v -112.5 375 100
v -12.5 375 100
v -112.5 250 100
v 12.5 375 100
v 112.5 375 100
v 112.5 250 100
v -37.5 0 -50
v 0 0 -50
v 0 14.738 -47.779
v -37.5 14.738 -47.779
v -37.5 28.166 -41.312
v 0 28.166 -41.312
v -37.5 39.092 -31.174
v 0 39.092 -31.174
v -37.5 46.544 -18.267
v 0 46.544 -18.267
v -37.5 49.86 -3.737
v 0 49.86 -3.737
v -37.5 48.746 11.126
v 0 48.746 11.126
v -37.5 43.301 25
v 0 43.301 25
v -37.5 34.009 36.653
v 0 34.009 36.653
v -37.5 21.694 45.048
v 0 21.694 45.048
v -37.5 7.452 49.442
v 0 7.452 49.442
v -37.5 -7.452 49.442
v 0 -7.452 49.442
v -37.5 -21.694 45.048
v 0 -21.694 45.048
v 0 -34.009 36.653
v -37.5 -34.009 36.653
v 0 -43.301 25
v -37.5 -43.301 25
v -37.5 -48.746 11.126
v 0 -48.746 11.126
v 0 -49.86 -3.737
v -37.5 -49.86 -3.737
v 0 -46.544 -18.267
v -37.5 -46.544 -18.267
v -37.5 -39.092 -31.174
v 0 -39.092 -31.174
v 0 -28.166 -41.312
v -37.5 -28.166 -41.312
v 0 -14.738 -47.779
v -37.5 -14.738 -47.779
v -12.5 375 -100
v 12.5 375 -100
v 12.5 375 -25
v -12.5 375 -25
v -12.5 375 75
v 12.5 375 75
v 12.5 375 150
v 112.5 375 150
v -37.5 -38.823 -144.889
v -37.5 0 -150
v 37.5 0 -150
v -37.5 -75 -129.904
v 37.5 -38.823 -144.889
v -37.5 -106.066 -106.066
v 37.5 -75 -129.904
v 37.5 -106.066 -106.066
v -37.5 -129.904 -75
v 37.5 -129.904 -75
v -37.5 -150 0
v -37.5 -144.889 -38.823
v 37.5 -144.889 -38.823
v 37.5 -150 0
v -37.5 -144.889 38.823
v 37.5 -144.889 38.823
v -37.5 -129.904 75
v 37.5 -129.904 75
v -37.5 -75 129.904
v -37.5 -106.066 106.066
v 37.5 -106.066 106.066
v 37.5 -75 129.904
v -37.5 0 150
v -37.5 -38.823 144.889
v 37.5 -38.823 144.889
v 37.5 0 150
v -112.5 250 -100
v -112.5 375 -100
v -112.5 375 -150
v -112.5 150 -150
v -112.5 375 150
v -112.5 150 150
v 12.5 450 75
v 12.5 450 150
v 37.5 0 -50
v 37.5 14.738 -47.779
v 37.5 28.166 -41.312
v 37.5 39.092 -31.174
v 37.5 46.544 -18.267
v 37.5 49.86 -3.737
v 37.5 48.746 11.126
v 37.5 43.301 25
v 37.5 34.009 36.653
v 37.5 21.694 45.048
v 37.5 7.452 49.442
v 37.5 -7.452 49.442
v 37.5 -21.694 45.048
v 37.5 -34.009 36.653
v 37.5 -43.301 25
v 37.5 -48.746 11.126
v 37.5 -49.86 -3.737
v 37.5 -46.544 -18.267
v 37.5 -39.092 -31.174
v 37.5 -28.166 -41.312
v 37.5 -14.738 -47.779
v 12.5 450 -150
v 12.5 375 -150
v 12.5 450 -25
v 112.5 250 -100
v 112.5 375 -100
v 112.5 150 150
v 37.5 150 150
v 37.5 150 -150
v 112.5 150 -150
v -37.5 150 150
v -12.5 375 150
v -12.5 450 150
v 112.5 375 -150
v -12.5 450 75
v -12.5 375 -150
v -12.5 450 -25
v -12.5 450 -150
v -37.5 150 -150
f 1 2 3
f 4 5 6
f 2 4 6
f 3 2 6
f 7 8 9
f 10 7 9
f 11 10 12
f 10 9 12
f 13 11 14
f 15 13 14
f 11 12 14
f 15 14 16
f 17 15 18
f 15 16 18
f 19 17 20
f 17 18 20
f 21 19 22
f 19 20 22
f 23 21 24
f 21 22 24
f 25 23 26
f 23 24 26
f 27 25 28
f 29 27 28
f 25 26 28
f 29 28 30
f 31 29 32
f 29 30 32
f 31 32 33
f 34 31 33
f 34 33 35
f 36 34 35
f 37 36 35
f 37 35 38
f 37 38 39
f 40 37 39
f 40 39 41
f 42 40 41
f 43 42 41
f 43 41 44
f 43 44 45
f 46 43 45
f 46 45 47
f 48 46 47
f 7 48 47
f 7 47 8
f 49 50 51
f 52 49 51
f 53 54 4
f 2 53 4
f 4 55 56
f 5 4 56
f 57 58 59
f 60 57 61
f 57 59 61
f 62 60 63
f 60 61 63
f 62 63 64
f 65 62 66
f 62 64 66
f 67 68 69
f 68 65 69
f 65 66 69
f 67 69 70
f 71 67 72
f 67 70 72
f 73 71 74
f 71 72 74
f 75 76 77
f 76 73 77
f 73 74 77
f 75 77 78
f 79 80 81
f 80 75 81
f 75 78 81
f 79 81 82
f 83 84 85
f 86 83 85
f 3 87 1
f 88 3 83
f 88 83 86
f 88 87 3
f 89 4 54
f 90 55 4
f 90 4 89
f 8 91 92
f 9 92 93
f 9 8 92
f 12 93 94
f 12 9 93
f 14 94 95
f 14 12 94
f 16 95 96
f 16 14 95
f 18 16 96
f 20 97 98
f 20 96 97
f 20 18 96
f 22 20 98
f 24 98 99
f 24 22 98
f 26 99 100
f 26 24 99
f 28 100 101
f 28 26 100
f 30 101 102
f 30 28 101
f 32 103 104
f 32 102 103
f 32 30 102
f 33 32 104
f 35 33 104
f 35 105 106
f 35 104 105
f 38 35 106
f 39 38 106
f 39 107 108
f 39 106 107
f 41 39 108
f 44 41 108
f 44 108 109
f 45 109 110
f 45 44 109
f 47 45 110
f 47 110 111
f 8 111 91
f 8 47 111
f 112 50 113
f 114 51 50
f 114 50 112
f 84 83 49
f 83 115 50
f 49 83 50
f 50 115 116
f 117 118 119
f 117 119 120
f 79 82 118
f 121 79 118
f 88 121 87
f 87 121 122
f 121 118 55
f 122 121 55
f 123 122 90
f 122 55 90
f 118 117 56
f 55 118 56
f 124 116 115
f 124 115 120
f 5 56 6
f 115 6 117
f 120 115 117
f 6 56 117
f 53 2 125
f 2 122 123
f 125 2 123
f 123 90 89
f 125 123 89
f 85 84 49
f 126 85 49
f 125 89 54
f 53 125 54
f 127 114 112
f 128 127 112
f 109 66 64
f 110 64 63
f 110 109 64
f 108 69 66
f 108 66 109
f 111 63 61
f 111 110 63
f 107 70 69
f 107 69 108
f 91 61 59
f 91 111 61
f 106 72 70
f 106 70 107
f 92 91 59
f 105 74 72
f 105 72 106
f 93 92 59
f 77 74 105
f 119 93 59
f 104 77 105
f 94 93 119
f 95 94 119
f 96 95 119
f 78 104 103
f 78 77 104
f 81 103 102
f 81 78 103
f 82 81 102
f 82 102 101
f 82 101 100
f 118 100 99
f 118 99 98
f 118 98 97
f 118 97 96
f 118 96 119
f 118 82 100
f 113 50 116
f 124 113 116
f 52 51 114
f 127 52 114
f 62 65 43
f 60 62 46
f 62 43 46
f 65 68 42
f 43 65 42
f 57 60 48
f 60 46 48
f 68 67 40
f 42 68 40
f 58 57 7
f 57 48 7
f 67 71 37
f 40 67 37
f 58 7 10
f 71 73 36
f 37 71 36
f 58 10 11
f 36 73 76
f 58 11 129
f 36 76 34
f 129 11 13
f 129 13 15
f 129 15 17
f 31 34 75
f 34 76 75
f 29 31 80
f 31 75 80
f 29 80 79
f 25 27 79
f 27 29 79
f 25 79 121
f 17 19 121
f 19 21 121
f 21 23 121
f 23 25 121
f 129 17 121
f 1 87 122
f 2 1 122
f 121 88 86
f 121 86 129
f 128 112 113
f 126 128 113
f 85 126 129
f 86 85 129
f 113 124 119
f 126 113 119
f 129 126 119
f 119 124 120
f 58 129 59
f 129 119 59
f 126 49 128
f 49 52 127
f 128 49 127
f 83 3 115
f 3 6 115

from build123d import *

# Parameters (mm, degrees)
SKETCH1_R           = 50
BOSS_EXTRUDE1_DEPTH = 112.5
SKETCH2_W           = 75
SKETCH2_H           = 300
SKETCH2_W_2         = 100
SKETCH2_H_2         = 75
CUT_EXTRUDE2_DEPTH  = 553.40949485


with BuildPart() as part:
    # Sketch1 → Boss-Extrude1 (new body)
    with BuildSketch(Plane.YZ):
        with BuildLine():
            Line((0, 150), (450, 150))
            Line((450, 150), (450, 75))
            Line((450, 75), (375, 75))
            Line((375, 75), (375, 100))
            Line((375, 100), (250, 100))
            Line((250, 100), (250, -100))
            Line((250, -100), (375, -100))
            Line((375, -100), (375, -25))
            Line((375, -25), (450, -25))
            Line((450, -25), (450, -150))
            Line((450, -150), (0, -150))
            ThreePointArc((0, -150), (-150, 0), (0, 150))
        make_face()
        with Locations(Location((0, 0, 0), (0, 0, 270))):
            Circle(SKETCH1_R, mode=Mode.SUBTRACT)
    extrude(amount=BOSS_EXTRUDE1_DEPTH)

    # Mirror1: part across plane


with BuildPart() as part_1:
    add(part.part)
    add(part.part.mirror(Plane(origin=(0, 0, 0), x_dir=(0, 0, 1), z_dir=(1, 0, 0))))

    # Sketch2 → Cut-Extrude2 (cut, through all)
    with BuildSketch(Plane.XY.offset(150)):
        with Locations((75, 0)):
            Rectangle(SKETCH2_W, SKETCH2_H)
        with Locations((62.5, 412.5)):
            Rectangle(SKETCH2_W_2, SKETCH2_H_2)
        with Locations((-75, 0)):
            Rectangle(SKETCH2_W, SKETCH2_H)
        with Locations((-62.5, 412.5)):
            Rectangle(SKETCH2_W_2, SKETCH2_H_2)
    extrude(amount=-CUT_EXTRUDE2_DEPTH, mode=Mode.SUBTRACT)


solid = part_1.part
